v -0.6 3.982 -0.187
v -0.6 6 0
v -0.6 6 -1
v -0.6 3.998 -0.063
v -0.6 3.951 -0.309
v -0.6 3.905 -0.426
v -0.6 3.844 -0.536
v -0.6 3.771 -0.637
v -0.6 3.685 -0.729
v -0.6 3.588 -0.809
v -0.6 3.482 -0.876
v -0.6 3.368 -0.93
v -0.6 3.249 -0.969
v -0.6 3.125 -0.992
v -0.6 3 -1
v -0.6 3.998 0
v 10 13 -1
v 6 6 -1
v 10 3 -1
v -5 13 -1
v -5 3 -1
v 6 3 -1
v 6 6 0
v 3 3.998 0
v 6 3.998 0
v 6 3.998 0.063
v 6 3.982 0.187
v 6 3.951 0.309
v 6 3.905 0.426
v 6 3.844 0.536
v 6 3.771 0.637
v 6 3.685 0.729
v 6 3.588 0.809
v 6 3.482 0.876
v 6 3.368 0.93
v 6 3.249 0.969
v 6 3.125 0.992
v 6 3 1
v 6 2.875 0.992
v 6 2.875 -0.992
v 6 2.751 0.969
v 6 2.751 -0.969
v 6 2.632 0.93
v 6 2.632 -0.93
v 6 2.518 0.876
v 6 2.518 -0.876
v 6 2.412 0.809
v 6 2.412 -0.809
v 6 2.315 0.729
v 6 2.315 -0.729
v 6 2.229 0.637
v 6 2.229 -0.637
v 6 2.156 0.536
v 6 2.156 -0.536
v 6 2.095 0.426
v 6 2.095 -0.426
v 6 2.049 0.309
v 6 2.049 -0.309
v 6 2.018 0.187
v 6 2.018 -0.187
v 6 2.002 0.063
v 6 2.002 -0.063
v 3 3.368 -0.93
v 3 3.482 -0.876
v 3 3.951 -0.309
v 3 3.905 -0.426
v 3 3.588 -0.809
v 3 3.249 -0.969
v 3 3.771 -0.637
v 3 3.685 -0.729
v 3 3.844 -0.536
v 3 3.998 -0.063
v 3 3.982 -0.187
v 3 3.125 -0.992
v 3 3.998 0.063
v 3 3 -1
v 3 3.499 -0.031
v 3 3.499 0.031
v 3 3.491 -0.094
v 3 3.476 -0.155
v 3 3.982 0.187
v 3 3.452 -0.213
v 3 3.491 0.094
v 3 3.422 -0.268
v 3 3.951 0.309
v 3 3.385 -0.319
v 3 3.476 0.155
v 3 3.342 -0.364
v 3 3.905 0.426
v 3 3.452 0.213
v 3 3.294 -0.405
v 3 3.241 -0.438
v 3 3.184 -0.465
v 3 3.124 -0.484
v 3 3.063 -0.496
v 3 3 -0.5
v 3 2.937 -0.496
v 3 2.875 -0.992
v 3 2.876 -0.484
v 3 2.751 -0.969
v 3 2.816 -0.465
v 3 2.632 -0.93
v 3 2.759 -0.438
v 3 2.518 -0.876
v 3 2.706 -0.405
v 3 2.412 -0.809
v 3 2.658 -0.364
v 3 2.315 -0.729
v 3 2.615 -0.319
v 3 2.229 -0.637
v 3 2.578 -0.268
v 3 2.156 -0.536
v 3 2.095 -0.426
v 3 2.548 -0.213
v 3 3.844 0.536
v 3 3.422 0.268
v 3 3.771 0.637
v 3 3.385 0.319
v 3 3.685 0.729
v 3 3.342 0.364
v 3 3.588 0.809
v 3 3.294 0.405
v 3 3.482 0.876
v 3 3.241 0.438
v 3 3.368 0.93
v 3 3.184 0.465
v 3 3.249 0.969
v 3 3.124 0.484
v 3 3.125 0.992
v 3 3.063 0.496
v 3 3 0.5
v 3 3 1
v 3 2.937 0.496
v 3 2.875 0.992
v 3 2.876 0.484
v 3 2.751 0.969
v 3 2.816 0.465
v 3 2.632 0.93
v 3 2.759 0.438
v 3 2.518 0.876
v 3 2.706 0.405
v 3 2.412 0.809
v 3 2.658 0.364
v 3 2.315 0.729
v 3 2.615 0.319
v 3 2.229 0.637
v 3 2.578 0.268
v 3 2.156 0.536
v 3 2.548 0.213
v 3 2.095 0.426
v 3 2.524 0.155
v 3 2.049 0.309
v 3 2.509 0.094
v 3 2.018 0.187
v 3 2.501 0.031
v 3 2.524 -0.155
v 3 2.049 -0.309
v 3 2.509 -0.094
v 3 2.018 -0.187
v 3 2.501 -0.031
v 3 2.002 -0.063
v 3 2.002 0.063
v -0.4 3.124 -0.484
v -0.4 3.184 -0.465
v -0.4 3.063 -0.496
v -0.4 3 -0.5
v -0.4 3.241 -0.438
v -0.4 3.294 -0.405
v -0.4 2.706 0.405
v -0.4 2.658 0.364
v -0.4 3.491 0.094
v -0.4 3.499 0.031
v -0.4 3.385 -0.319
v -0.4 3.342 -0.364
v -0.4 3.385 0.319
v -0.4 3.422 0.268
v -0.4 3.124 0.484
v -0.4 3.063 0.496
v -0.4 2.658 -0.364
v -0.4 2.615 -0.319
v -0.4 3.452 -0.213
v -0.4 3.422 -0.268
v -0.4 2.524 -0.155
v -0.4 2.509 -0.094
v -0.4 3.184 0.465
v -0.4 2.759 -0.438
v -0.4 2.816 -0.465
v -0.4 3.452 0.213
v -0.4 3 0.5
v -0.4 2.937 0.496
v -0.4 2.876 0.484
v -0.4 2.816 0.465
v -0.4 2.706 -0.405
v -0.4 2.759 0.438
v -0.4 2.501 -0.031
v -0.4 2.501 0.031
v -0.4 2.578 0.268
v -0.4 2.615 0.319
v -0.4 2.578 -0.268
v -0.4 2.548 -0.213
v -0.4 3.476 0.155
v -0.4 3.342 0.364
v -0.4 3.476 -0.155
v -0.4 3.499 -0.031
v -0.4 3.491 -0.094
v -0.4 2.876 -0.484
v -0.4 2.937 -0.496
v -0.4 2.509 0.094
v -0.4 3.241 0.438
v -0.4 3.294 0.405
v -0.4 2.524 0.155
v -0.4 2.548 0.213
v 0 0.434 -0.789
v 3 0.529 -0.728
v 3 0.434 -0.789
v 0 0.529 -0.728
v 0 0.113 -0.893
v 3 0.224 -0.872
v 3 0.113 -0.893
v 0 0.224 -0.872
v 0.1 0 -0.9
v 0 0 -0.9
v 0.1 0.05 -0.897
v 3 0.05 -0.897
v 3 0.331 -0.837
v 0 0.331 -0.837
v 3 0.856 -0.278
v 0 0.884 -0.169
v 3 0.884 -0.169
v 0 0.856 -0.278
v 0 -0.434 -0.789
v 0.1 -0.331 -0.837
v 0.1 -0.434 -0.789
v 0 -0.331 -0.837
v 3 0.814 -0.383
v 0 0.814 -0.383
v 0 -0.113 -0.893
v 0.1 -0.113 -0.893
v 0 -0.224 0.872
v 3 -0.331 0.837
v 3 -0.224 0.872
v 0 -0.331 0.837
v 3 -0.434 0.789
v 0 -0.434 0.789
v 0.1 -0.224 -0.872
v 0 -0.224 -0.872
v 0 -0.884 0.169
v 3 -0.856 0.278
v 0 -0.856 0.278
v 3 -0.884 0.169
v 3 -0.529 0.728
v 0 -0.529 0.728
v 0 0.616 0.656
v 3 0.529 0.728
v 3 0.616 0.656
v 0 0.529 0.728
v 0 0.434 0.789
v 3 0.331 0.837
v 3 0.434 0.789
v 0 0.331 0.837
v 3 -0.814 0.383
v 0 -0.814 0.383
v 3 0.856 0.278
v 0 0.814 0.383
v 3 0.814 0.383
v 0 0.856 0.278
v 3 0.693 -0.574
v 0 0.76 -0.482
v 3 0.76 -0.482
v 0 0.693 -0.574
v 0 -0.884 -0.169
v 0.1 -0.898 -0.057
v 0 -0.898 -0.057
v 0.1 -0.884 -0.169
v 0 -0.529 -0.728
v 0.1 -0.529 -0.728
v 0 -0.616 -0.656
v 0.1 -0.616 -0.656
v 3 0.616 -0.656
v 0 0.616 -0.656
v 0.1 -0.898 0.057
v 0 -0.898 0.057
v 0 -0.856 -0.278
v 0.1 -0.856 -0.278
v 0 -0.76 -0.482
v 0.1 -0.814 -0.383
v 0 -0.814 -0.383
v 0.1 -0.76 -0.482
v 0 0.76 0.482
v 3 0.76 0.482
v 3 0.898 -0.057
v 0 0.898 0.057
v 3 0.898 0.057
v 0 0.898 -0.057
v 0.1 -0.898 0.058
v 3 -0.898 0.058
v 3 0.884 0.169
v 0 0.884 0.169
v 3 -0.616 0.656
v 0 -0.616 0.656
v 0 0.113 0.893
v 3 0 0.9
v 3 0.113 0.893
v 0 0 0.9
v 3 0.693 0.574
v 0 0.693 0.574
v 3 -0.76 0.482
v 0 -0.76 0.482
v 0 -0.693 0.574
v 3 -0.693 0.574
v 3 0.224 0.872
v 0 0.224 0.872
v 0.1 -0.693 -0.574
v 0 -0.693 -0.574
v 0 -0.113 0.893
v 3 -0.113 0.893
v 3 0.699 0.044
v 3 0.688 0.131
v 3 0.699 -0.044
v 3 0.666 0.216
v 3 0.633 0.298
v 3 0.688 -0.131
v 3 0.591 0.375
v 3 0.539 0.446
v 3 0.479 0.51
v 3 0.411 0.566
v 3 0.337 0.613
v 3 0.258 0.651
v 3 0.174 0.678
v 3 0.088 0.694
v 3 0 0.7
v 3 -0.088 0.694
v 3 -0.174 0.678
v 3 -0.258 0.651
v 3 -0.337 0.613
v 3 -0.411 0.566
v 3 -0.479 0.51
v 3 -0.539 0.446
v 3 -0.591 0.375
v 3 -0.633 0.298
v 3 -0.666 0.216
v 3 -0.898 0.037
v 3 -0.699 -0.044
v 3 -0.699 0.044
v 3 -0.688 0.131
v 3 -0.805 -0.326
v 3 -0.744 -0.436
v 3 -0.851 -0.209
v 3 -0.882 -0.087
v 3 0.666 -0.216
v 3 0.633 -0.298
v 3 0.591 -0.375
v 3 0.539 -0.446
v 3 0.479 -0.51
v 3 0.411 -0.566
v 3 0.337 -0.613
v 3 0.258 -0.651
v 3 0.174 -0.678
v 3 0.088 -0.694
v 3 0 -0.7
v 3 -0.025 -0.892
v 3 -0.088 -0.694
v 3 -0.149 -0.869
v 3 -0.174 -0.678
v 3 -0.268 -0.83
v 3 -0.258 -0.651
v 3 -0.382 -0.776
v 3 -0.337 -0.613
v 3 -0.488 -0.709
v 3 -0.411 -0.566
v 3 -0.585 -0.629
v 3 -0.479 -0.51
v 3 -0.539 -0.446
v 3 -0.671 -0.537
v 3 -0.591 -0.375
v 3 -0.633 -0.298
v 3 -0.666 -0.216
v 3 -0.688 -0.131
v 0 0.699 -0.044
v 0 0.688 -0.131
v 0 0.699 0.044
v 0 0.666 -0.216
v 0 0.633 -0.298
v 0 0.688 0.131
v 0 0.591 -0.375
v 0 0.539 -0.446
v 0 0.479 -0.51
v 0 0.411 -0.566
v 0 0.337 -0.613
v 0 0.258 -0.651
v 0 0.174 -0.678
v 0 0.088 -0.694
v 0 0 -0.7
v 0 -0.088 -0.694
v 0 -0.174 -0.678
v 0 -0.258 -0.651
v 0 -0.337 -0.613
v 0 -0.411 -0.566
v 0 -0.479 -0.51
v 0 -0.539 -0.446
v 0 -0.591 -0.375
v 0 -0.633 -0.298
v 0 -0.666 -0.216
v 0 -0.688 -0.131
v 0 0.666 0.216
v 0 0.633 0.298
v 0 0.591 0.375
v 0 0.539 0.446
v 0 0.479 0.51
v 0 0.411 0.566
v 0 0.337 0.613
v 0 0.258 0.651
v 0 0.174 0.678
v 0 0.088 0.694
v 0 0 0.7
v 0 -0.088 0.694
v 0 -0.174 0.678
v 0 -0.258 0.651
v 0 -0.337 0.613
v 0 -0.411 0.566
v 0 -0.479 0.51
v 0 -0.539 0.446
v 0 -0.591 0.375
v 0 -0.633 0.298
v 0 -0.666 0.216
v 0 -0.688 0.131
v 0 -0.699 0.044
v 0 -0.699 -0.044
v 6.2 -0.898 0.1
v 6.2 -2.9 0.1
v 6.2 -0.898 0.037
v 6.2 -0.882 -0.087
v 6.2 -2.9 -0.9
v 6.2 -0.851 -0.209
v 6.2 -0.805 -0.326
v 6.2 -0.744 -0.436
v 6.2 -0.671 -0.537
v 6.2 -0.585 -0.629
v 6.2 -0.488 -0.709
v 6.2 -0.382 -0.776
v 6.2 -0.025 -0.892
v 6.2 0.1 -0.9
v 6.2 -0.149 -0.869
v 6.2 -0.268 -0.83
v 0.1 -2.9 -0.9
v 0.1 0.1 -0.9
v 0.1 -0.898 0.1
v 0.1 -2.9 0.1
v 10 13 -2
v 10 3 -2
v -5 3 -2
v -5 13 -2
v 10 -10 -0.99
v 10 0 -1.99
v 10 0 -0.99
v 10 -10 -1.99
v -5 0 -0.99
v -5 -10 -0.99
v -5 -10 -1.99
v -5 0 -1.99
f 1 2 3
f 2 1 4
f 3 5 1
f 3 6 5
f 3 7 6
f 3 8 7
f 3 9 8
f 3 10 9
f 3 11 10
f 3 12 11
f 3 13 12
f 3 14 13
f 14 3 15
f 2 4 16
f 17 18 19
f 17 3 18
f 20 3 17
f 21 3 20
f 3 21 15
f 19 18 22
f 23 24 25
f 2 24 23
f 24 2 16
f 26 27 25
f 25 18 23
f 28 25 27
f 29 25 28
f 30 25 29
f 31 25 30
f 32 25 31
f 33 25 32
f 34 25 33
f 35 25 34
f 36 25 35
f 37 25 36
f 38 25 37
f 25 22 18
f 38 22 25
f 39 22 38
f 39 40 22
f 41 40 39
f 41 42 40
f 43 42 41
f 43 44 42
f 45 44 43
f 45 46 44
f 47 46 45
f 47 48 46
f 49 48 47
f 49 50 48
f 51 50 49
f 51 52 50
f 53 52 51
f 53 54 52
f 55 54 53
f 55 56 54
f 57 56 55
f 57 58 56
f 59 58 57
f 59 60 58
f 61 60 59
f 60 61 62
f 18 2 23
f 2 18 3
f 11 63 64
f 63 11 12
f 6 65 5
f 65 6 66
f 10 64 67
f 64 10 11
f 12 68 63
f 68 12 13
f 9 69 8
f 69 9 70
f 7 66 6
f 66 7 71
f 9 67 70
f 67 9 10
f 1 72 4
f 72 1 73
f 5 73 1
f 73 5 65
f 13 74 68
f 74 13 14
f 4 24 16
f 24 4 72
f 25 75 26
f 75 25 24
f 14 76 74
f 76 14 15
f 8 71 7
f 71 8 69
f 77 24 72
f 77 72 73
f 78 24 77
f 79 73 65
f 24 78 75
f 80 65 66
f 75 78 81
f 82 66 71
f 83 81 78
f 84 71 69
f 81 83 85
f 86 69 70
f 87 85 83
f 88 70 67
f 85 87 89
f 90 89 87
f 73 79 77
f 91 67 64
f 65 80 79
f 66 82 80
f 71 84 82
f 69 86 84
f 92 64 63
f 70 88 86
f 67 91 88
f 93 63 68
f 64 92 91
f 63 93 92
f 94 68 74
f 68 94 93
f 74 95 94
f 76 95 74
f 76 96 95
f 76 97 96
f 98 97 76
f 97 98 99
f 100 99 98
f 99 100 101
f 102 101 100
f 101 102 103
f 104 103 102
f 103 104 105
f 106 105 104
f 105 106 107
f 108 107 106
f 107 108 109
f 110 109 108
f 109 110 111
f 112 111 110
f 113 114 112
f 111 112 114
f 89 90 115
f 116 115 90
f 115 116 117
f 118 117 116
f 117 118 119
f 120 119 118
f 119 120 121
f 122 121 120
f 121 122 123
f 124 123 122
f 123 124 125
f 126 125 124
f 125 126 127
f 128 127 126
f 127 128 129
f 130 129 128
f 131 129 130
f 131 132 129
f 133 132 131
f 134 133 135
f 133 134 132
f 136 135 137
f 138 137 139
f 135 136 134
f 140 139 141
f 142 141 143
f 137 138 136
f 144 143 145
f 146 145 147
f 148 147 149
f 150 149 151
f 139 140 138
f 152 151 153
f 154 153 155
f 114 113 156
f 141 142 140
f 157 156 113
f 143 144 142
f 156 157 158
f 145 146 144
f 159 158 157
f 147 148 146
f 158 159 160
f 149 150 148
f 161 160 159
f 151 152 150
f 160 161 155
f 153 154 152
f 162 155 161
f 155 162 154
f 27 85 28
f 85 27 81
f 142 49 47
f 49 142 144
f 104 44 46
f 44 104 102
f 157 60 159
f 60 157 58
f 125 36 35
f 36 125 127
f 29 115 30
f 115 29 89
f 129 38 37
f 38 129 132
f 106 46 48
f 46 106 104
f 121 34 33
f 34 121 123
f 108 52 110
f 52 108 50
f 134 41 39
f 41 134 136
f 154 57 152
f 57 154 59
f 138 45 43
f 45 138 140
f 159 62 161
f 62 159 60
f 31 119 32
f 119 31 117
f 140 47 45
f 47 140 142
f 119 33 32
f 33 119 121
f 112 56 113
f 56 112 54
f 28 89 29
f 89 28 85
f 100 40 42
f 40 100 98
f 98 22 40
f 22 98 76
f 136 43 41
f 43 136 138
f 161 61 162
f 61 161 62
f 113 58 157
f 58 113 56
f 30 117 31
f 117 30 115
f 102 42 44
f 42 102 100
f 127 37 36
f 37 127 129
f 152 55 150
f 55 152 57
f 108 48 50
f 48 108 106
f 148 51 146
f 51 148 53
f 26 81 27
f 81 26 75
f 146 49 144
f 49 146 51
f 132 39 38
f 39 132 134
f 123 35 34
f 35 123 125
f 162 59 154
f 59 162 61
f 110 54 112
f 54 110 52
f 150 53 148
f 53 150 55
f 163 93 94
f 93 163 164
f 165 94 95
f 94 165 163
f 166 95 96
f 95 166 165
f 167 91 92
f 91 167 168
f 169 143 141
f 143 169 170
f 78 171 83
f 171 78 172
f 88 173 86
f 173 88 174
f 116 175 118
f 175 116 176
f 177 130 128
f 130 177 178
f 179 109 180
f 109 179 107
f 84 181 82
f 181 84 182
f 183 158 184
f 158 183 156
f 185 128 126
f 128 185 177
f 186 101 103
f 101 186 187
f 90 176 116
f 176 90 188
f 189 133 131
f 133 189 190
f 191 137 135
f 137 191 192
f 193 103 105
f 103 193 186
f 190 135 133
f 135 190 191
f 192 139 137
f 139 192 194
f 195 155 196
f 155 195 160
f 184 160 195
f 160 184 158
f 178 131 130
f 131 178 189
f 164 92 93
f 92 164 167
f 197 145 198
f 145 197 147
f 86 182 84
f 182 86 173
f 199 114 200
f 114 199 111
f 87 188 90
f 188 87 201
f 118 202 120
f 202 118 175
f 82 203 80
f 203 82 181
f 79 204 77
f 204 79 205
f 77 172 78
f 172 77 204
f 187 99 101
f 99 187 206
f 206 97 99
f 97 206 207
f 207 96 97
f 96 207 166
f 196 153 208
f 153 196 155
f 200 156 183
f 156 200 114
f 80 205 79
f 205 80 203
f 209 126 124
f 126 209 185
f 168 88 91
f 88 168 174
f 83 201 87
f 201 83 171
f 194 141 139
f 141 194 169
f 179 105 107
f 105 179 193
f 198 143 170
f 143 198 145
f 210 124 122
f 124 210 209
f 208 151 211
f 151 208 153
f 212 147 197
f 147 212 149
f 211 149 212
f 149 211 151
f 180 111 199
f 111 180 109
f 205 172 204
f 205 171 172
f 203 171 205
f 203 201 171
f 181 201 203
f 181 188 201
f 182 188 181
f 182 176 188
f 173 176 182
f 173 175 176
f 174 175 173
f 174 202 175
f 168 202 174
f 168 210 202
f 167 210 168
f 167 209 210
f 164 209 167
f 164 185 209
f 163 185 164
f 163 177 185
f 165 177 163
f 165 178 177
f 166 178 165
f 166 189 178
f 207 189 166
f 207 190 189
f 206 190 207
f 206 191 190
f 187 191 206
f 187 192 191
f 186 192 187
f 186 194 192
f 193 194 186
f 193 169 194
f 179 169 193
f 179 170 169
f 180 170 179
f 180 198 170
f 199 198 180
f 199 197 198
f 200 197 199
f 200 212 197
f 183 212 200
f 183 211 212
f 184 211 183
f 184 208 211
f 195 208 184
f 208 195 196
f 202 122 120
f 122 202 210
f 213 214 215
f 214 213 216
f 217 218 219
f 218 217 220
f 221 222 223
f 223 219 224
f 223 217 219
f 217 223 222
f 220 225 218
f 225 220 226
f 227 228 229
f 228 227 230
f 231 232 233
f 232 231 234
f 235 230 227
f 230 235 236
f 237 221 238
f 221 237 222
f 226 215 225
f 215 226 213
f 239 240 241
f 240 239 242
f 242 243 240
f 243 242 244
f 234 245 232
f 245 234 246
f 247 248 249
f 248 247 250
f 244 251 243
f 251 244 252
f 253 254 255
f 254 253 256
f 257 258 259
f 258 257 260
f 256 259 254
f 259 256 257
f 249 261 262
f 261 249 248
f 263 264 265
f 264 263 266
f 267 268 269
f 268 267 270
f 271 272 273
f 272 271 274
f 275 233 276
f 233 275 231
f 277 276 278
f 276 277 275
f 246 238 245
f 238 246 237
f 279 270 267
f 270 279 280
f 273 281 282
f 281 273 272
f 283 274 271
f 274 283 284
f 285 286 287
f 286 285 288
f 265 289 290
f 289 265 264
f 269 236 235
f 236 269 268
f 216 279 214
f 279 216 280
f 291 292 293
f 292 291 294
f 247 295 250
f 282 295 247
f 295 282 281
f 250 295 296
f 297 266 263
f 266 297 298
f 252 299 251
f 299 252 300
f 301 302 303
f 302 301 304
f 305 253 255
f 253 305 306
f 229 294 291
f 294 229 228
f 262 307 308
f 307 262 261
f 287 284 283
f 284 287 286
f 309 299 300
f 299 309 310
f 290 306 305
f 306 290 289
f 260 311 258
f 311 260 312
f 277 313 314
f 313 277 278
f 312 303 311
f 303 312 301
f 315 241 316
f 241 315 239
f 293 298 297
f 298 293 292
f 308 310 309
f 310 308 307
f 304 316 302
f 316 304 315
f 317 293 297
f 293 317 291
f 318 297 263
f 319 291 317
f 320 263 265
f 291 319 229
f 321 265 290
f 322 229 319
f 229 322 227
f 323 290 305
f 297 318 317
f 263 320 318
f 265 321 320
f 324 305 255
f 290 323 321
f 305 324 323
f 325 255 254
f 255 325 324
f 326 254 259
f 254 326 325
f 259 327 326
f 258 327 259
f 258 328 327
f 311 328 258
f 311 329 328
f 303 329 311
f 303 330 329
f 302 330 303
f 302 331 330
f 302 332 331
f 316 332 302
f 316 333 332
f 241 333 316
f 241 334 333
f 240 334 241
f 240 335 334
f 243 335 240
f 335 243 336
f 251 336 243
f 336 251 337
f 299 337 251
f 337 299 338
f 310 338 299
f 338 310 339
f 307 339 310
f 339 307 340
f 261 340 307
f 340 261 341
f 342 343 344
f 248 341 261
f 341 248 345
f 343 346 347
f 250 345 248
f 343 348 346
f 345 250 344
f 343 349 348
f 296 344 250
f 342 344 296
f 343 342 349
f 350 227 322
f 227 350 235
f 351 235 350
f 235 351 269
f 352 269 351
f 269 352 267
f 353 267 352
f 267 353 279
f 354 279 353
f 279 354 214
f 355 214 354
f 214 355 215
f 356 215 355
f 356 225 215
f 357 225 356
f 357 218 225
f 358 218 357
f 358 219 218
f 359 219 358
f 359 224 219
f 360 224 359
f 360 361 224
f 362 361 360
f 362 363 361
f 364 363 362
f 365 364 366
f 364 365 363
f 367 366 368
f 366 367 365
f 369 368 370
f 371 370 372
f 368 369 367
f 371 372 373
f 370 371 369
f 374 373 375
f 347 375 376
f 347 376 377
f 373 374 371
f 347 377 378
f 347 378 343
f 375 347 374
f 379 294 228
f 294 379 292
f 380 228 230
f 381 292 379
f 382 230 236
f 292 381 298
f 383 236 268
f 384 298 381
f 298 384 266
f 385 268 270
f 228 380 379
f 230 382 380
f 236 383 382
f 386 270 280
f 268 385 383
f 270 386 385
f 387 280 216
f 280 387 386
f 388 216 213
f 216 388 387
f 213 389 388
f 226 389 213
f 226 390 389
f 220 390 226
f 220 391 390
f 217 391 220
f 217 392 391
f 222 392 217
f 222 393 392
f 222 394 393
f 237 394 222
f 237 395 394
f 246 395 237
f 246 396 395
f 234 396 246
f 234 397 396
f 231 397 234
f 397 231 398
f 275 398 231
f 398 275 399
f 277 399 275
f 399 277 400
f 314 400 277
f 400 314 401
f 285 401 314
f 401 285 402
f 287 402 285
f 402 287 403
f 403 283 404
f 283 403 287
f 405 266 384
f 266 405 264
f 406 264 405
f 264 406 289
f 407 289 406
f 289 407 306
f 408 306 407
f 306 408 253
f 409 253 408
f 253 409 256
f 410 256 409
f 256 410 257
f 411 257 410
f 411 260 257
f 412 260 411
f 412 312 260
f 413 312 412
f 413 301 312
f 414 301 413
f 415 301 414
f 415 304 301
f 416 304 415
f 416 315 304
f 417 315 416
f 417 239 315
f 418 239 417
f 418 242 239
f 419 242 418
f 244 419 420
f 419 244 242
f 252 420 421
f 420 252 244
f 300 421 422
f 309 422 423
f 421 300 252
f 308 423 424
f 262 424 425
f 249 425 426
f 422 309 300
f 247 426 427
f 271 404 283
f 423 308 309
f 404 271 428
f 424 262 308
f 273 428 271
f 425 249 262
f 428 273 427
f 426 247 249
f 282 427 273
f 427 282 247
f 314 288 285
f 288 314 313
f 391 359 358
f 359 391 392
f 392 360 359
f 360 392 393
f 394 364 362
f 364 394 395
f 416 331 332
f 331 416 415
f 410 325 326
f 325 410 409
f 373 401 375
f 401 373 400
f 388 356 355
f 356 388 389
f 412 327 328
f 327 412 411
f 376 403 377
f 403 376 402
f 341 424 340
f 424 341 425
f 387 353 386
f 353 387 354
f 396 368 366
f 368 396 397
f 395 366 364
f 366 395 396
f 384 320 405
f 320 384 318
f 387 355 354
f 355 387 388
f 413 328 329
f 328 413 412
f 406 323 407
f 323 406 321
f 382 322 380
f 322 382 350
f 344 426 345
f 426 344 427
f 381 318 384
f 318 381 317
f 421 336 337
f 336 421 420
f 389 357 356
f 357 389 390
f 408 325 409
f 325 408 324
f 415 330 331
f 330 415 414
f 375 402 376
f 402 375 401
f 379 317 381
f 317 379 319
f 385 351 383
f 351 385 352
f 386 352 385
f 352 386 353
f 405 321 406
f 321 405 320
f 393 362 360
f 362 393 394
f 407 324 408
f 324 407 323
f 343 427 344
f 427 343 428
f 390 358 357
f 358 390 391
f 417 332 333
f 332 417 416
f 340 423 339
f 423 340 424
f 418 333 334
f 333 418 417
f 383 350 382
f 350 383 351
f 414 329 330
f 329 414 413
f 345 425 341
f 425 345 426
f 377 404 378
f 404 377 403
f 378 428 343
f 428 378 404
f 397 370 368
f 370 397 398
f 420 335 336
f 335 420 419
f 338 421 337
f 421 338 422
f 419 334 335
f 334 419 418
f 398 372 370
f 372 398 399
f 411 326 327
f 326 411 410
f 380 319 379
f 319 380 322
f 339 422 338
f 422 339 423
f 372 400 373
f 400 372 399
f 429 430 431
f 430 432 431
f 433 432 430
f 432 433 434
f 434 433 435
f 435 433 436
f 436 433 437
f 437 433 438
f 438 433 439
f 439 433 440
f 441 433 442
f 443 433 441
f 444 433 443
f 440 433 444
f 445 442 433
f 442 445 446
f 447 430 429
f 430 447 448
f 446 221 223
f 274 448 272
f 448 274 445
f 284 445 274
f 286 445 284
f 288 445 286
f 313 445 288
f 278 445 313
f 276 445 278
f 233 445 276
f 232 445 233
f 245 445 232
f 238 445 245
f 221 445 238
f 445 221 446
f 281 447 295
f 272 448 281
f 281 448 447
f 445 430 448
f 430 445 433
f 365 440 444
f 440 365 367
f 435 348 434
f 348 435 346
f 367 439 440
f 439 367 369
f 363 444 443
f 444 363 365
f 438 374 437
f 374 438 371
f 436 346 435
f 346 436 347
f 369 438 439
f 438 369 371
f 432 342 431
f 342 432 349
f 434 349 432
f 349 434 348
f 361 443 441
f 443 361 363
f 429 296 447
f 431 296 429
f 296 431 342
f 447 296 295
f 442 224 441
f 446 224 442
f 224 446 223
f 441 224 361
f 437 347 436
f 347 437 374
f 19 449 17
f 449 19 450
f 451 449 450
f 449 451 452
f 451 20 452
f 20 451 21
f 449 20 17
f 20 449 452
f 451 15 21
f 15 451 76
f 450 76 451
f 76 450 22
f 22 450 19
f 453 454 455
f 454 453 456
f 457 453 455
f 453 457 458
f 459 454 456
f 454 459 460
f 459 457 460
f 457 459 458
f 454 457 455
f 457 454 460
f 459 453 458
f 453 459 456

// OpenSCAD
// file: hinge.scad
module block_long() { //long block
	difference(){
		cube([6.6, 3, 1]);
		
		translate([-1,0,0])
			rotate([0,270,180])
			cylinder(h=8, r=1, $fn=50);
	}
}

module block_short() { //long block
	difference(){
		cube([6.1,3,1]);
		
		translate([-1,0,0])
			rotate([0,270,180])
			cylinder(h=8, r=1, $fn=50);
	}
}

module cylinder_bottom(){
	difference(){
		cylinder(h=3, r=0.9, $fn=50);

		translate([0,0,-1])
			cylinder(h=8, r=0.7, $fn=50);
	}

	translate([-.1, .1, .1])
	rotate([0,270,180])
		block_short();
}

module cylinder_top(){

	translate([0,0,3])
		cylinder(h=3, r=1, $fn=50);
	translate([0,0,-.4]) //innder dowel
		cylinder(h=6.4, r=.5, $fn=50);

	translate([0, 0, 6])
		rotate([0,90,0])
			block_long();
//	translate([0,0,-.6])

//	cylinder(h=.2, r=1, $fn=50);
}

color("blue")
translate([0,-.2,-0.3])
	rotate([0,0, -50])
	cylinder_bottom();


cylinder_top();
// main file
use <hinge.scad>;
rotate([0,90,0]){
	color("blue")
	//rotate([0,0,30])
		translate([0,3,0])
			cylinder_top();
	cylinder_bottom();
}

color("red")
translate([-5,3,-2])
//rotate([30,0,0])
cube([15,10,1]);

translate([-5,-10,-1.99])
cube([15,10,1]);
